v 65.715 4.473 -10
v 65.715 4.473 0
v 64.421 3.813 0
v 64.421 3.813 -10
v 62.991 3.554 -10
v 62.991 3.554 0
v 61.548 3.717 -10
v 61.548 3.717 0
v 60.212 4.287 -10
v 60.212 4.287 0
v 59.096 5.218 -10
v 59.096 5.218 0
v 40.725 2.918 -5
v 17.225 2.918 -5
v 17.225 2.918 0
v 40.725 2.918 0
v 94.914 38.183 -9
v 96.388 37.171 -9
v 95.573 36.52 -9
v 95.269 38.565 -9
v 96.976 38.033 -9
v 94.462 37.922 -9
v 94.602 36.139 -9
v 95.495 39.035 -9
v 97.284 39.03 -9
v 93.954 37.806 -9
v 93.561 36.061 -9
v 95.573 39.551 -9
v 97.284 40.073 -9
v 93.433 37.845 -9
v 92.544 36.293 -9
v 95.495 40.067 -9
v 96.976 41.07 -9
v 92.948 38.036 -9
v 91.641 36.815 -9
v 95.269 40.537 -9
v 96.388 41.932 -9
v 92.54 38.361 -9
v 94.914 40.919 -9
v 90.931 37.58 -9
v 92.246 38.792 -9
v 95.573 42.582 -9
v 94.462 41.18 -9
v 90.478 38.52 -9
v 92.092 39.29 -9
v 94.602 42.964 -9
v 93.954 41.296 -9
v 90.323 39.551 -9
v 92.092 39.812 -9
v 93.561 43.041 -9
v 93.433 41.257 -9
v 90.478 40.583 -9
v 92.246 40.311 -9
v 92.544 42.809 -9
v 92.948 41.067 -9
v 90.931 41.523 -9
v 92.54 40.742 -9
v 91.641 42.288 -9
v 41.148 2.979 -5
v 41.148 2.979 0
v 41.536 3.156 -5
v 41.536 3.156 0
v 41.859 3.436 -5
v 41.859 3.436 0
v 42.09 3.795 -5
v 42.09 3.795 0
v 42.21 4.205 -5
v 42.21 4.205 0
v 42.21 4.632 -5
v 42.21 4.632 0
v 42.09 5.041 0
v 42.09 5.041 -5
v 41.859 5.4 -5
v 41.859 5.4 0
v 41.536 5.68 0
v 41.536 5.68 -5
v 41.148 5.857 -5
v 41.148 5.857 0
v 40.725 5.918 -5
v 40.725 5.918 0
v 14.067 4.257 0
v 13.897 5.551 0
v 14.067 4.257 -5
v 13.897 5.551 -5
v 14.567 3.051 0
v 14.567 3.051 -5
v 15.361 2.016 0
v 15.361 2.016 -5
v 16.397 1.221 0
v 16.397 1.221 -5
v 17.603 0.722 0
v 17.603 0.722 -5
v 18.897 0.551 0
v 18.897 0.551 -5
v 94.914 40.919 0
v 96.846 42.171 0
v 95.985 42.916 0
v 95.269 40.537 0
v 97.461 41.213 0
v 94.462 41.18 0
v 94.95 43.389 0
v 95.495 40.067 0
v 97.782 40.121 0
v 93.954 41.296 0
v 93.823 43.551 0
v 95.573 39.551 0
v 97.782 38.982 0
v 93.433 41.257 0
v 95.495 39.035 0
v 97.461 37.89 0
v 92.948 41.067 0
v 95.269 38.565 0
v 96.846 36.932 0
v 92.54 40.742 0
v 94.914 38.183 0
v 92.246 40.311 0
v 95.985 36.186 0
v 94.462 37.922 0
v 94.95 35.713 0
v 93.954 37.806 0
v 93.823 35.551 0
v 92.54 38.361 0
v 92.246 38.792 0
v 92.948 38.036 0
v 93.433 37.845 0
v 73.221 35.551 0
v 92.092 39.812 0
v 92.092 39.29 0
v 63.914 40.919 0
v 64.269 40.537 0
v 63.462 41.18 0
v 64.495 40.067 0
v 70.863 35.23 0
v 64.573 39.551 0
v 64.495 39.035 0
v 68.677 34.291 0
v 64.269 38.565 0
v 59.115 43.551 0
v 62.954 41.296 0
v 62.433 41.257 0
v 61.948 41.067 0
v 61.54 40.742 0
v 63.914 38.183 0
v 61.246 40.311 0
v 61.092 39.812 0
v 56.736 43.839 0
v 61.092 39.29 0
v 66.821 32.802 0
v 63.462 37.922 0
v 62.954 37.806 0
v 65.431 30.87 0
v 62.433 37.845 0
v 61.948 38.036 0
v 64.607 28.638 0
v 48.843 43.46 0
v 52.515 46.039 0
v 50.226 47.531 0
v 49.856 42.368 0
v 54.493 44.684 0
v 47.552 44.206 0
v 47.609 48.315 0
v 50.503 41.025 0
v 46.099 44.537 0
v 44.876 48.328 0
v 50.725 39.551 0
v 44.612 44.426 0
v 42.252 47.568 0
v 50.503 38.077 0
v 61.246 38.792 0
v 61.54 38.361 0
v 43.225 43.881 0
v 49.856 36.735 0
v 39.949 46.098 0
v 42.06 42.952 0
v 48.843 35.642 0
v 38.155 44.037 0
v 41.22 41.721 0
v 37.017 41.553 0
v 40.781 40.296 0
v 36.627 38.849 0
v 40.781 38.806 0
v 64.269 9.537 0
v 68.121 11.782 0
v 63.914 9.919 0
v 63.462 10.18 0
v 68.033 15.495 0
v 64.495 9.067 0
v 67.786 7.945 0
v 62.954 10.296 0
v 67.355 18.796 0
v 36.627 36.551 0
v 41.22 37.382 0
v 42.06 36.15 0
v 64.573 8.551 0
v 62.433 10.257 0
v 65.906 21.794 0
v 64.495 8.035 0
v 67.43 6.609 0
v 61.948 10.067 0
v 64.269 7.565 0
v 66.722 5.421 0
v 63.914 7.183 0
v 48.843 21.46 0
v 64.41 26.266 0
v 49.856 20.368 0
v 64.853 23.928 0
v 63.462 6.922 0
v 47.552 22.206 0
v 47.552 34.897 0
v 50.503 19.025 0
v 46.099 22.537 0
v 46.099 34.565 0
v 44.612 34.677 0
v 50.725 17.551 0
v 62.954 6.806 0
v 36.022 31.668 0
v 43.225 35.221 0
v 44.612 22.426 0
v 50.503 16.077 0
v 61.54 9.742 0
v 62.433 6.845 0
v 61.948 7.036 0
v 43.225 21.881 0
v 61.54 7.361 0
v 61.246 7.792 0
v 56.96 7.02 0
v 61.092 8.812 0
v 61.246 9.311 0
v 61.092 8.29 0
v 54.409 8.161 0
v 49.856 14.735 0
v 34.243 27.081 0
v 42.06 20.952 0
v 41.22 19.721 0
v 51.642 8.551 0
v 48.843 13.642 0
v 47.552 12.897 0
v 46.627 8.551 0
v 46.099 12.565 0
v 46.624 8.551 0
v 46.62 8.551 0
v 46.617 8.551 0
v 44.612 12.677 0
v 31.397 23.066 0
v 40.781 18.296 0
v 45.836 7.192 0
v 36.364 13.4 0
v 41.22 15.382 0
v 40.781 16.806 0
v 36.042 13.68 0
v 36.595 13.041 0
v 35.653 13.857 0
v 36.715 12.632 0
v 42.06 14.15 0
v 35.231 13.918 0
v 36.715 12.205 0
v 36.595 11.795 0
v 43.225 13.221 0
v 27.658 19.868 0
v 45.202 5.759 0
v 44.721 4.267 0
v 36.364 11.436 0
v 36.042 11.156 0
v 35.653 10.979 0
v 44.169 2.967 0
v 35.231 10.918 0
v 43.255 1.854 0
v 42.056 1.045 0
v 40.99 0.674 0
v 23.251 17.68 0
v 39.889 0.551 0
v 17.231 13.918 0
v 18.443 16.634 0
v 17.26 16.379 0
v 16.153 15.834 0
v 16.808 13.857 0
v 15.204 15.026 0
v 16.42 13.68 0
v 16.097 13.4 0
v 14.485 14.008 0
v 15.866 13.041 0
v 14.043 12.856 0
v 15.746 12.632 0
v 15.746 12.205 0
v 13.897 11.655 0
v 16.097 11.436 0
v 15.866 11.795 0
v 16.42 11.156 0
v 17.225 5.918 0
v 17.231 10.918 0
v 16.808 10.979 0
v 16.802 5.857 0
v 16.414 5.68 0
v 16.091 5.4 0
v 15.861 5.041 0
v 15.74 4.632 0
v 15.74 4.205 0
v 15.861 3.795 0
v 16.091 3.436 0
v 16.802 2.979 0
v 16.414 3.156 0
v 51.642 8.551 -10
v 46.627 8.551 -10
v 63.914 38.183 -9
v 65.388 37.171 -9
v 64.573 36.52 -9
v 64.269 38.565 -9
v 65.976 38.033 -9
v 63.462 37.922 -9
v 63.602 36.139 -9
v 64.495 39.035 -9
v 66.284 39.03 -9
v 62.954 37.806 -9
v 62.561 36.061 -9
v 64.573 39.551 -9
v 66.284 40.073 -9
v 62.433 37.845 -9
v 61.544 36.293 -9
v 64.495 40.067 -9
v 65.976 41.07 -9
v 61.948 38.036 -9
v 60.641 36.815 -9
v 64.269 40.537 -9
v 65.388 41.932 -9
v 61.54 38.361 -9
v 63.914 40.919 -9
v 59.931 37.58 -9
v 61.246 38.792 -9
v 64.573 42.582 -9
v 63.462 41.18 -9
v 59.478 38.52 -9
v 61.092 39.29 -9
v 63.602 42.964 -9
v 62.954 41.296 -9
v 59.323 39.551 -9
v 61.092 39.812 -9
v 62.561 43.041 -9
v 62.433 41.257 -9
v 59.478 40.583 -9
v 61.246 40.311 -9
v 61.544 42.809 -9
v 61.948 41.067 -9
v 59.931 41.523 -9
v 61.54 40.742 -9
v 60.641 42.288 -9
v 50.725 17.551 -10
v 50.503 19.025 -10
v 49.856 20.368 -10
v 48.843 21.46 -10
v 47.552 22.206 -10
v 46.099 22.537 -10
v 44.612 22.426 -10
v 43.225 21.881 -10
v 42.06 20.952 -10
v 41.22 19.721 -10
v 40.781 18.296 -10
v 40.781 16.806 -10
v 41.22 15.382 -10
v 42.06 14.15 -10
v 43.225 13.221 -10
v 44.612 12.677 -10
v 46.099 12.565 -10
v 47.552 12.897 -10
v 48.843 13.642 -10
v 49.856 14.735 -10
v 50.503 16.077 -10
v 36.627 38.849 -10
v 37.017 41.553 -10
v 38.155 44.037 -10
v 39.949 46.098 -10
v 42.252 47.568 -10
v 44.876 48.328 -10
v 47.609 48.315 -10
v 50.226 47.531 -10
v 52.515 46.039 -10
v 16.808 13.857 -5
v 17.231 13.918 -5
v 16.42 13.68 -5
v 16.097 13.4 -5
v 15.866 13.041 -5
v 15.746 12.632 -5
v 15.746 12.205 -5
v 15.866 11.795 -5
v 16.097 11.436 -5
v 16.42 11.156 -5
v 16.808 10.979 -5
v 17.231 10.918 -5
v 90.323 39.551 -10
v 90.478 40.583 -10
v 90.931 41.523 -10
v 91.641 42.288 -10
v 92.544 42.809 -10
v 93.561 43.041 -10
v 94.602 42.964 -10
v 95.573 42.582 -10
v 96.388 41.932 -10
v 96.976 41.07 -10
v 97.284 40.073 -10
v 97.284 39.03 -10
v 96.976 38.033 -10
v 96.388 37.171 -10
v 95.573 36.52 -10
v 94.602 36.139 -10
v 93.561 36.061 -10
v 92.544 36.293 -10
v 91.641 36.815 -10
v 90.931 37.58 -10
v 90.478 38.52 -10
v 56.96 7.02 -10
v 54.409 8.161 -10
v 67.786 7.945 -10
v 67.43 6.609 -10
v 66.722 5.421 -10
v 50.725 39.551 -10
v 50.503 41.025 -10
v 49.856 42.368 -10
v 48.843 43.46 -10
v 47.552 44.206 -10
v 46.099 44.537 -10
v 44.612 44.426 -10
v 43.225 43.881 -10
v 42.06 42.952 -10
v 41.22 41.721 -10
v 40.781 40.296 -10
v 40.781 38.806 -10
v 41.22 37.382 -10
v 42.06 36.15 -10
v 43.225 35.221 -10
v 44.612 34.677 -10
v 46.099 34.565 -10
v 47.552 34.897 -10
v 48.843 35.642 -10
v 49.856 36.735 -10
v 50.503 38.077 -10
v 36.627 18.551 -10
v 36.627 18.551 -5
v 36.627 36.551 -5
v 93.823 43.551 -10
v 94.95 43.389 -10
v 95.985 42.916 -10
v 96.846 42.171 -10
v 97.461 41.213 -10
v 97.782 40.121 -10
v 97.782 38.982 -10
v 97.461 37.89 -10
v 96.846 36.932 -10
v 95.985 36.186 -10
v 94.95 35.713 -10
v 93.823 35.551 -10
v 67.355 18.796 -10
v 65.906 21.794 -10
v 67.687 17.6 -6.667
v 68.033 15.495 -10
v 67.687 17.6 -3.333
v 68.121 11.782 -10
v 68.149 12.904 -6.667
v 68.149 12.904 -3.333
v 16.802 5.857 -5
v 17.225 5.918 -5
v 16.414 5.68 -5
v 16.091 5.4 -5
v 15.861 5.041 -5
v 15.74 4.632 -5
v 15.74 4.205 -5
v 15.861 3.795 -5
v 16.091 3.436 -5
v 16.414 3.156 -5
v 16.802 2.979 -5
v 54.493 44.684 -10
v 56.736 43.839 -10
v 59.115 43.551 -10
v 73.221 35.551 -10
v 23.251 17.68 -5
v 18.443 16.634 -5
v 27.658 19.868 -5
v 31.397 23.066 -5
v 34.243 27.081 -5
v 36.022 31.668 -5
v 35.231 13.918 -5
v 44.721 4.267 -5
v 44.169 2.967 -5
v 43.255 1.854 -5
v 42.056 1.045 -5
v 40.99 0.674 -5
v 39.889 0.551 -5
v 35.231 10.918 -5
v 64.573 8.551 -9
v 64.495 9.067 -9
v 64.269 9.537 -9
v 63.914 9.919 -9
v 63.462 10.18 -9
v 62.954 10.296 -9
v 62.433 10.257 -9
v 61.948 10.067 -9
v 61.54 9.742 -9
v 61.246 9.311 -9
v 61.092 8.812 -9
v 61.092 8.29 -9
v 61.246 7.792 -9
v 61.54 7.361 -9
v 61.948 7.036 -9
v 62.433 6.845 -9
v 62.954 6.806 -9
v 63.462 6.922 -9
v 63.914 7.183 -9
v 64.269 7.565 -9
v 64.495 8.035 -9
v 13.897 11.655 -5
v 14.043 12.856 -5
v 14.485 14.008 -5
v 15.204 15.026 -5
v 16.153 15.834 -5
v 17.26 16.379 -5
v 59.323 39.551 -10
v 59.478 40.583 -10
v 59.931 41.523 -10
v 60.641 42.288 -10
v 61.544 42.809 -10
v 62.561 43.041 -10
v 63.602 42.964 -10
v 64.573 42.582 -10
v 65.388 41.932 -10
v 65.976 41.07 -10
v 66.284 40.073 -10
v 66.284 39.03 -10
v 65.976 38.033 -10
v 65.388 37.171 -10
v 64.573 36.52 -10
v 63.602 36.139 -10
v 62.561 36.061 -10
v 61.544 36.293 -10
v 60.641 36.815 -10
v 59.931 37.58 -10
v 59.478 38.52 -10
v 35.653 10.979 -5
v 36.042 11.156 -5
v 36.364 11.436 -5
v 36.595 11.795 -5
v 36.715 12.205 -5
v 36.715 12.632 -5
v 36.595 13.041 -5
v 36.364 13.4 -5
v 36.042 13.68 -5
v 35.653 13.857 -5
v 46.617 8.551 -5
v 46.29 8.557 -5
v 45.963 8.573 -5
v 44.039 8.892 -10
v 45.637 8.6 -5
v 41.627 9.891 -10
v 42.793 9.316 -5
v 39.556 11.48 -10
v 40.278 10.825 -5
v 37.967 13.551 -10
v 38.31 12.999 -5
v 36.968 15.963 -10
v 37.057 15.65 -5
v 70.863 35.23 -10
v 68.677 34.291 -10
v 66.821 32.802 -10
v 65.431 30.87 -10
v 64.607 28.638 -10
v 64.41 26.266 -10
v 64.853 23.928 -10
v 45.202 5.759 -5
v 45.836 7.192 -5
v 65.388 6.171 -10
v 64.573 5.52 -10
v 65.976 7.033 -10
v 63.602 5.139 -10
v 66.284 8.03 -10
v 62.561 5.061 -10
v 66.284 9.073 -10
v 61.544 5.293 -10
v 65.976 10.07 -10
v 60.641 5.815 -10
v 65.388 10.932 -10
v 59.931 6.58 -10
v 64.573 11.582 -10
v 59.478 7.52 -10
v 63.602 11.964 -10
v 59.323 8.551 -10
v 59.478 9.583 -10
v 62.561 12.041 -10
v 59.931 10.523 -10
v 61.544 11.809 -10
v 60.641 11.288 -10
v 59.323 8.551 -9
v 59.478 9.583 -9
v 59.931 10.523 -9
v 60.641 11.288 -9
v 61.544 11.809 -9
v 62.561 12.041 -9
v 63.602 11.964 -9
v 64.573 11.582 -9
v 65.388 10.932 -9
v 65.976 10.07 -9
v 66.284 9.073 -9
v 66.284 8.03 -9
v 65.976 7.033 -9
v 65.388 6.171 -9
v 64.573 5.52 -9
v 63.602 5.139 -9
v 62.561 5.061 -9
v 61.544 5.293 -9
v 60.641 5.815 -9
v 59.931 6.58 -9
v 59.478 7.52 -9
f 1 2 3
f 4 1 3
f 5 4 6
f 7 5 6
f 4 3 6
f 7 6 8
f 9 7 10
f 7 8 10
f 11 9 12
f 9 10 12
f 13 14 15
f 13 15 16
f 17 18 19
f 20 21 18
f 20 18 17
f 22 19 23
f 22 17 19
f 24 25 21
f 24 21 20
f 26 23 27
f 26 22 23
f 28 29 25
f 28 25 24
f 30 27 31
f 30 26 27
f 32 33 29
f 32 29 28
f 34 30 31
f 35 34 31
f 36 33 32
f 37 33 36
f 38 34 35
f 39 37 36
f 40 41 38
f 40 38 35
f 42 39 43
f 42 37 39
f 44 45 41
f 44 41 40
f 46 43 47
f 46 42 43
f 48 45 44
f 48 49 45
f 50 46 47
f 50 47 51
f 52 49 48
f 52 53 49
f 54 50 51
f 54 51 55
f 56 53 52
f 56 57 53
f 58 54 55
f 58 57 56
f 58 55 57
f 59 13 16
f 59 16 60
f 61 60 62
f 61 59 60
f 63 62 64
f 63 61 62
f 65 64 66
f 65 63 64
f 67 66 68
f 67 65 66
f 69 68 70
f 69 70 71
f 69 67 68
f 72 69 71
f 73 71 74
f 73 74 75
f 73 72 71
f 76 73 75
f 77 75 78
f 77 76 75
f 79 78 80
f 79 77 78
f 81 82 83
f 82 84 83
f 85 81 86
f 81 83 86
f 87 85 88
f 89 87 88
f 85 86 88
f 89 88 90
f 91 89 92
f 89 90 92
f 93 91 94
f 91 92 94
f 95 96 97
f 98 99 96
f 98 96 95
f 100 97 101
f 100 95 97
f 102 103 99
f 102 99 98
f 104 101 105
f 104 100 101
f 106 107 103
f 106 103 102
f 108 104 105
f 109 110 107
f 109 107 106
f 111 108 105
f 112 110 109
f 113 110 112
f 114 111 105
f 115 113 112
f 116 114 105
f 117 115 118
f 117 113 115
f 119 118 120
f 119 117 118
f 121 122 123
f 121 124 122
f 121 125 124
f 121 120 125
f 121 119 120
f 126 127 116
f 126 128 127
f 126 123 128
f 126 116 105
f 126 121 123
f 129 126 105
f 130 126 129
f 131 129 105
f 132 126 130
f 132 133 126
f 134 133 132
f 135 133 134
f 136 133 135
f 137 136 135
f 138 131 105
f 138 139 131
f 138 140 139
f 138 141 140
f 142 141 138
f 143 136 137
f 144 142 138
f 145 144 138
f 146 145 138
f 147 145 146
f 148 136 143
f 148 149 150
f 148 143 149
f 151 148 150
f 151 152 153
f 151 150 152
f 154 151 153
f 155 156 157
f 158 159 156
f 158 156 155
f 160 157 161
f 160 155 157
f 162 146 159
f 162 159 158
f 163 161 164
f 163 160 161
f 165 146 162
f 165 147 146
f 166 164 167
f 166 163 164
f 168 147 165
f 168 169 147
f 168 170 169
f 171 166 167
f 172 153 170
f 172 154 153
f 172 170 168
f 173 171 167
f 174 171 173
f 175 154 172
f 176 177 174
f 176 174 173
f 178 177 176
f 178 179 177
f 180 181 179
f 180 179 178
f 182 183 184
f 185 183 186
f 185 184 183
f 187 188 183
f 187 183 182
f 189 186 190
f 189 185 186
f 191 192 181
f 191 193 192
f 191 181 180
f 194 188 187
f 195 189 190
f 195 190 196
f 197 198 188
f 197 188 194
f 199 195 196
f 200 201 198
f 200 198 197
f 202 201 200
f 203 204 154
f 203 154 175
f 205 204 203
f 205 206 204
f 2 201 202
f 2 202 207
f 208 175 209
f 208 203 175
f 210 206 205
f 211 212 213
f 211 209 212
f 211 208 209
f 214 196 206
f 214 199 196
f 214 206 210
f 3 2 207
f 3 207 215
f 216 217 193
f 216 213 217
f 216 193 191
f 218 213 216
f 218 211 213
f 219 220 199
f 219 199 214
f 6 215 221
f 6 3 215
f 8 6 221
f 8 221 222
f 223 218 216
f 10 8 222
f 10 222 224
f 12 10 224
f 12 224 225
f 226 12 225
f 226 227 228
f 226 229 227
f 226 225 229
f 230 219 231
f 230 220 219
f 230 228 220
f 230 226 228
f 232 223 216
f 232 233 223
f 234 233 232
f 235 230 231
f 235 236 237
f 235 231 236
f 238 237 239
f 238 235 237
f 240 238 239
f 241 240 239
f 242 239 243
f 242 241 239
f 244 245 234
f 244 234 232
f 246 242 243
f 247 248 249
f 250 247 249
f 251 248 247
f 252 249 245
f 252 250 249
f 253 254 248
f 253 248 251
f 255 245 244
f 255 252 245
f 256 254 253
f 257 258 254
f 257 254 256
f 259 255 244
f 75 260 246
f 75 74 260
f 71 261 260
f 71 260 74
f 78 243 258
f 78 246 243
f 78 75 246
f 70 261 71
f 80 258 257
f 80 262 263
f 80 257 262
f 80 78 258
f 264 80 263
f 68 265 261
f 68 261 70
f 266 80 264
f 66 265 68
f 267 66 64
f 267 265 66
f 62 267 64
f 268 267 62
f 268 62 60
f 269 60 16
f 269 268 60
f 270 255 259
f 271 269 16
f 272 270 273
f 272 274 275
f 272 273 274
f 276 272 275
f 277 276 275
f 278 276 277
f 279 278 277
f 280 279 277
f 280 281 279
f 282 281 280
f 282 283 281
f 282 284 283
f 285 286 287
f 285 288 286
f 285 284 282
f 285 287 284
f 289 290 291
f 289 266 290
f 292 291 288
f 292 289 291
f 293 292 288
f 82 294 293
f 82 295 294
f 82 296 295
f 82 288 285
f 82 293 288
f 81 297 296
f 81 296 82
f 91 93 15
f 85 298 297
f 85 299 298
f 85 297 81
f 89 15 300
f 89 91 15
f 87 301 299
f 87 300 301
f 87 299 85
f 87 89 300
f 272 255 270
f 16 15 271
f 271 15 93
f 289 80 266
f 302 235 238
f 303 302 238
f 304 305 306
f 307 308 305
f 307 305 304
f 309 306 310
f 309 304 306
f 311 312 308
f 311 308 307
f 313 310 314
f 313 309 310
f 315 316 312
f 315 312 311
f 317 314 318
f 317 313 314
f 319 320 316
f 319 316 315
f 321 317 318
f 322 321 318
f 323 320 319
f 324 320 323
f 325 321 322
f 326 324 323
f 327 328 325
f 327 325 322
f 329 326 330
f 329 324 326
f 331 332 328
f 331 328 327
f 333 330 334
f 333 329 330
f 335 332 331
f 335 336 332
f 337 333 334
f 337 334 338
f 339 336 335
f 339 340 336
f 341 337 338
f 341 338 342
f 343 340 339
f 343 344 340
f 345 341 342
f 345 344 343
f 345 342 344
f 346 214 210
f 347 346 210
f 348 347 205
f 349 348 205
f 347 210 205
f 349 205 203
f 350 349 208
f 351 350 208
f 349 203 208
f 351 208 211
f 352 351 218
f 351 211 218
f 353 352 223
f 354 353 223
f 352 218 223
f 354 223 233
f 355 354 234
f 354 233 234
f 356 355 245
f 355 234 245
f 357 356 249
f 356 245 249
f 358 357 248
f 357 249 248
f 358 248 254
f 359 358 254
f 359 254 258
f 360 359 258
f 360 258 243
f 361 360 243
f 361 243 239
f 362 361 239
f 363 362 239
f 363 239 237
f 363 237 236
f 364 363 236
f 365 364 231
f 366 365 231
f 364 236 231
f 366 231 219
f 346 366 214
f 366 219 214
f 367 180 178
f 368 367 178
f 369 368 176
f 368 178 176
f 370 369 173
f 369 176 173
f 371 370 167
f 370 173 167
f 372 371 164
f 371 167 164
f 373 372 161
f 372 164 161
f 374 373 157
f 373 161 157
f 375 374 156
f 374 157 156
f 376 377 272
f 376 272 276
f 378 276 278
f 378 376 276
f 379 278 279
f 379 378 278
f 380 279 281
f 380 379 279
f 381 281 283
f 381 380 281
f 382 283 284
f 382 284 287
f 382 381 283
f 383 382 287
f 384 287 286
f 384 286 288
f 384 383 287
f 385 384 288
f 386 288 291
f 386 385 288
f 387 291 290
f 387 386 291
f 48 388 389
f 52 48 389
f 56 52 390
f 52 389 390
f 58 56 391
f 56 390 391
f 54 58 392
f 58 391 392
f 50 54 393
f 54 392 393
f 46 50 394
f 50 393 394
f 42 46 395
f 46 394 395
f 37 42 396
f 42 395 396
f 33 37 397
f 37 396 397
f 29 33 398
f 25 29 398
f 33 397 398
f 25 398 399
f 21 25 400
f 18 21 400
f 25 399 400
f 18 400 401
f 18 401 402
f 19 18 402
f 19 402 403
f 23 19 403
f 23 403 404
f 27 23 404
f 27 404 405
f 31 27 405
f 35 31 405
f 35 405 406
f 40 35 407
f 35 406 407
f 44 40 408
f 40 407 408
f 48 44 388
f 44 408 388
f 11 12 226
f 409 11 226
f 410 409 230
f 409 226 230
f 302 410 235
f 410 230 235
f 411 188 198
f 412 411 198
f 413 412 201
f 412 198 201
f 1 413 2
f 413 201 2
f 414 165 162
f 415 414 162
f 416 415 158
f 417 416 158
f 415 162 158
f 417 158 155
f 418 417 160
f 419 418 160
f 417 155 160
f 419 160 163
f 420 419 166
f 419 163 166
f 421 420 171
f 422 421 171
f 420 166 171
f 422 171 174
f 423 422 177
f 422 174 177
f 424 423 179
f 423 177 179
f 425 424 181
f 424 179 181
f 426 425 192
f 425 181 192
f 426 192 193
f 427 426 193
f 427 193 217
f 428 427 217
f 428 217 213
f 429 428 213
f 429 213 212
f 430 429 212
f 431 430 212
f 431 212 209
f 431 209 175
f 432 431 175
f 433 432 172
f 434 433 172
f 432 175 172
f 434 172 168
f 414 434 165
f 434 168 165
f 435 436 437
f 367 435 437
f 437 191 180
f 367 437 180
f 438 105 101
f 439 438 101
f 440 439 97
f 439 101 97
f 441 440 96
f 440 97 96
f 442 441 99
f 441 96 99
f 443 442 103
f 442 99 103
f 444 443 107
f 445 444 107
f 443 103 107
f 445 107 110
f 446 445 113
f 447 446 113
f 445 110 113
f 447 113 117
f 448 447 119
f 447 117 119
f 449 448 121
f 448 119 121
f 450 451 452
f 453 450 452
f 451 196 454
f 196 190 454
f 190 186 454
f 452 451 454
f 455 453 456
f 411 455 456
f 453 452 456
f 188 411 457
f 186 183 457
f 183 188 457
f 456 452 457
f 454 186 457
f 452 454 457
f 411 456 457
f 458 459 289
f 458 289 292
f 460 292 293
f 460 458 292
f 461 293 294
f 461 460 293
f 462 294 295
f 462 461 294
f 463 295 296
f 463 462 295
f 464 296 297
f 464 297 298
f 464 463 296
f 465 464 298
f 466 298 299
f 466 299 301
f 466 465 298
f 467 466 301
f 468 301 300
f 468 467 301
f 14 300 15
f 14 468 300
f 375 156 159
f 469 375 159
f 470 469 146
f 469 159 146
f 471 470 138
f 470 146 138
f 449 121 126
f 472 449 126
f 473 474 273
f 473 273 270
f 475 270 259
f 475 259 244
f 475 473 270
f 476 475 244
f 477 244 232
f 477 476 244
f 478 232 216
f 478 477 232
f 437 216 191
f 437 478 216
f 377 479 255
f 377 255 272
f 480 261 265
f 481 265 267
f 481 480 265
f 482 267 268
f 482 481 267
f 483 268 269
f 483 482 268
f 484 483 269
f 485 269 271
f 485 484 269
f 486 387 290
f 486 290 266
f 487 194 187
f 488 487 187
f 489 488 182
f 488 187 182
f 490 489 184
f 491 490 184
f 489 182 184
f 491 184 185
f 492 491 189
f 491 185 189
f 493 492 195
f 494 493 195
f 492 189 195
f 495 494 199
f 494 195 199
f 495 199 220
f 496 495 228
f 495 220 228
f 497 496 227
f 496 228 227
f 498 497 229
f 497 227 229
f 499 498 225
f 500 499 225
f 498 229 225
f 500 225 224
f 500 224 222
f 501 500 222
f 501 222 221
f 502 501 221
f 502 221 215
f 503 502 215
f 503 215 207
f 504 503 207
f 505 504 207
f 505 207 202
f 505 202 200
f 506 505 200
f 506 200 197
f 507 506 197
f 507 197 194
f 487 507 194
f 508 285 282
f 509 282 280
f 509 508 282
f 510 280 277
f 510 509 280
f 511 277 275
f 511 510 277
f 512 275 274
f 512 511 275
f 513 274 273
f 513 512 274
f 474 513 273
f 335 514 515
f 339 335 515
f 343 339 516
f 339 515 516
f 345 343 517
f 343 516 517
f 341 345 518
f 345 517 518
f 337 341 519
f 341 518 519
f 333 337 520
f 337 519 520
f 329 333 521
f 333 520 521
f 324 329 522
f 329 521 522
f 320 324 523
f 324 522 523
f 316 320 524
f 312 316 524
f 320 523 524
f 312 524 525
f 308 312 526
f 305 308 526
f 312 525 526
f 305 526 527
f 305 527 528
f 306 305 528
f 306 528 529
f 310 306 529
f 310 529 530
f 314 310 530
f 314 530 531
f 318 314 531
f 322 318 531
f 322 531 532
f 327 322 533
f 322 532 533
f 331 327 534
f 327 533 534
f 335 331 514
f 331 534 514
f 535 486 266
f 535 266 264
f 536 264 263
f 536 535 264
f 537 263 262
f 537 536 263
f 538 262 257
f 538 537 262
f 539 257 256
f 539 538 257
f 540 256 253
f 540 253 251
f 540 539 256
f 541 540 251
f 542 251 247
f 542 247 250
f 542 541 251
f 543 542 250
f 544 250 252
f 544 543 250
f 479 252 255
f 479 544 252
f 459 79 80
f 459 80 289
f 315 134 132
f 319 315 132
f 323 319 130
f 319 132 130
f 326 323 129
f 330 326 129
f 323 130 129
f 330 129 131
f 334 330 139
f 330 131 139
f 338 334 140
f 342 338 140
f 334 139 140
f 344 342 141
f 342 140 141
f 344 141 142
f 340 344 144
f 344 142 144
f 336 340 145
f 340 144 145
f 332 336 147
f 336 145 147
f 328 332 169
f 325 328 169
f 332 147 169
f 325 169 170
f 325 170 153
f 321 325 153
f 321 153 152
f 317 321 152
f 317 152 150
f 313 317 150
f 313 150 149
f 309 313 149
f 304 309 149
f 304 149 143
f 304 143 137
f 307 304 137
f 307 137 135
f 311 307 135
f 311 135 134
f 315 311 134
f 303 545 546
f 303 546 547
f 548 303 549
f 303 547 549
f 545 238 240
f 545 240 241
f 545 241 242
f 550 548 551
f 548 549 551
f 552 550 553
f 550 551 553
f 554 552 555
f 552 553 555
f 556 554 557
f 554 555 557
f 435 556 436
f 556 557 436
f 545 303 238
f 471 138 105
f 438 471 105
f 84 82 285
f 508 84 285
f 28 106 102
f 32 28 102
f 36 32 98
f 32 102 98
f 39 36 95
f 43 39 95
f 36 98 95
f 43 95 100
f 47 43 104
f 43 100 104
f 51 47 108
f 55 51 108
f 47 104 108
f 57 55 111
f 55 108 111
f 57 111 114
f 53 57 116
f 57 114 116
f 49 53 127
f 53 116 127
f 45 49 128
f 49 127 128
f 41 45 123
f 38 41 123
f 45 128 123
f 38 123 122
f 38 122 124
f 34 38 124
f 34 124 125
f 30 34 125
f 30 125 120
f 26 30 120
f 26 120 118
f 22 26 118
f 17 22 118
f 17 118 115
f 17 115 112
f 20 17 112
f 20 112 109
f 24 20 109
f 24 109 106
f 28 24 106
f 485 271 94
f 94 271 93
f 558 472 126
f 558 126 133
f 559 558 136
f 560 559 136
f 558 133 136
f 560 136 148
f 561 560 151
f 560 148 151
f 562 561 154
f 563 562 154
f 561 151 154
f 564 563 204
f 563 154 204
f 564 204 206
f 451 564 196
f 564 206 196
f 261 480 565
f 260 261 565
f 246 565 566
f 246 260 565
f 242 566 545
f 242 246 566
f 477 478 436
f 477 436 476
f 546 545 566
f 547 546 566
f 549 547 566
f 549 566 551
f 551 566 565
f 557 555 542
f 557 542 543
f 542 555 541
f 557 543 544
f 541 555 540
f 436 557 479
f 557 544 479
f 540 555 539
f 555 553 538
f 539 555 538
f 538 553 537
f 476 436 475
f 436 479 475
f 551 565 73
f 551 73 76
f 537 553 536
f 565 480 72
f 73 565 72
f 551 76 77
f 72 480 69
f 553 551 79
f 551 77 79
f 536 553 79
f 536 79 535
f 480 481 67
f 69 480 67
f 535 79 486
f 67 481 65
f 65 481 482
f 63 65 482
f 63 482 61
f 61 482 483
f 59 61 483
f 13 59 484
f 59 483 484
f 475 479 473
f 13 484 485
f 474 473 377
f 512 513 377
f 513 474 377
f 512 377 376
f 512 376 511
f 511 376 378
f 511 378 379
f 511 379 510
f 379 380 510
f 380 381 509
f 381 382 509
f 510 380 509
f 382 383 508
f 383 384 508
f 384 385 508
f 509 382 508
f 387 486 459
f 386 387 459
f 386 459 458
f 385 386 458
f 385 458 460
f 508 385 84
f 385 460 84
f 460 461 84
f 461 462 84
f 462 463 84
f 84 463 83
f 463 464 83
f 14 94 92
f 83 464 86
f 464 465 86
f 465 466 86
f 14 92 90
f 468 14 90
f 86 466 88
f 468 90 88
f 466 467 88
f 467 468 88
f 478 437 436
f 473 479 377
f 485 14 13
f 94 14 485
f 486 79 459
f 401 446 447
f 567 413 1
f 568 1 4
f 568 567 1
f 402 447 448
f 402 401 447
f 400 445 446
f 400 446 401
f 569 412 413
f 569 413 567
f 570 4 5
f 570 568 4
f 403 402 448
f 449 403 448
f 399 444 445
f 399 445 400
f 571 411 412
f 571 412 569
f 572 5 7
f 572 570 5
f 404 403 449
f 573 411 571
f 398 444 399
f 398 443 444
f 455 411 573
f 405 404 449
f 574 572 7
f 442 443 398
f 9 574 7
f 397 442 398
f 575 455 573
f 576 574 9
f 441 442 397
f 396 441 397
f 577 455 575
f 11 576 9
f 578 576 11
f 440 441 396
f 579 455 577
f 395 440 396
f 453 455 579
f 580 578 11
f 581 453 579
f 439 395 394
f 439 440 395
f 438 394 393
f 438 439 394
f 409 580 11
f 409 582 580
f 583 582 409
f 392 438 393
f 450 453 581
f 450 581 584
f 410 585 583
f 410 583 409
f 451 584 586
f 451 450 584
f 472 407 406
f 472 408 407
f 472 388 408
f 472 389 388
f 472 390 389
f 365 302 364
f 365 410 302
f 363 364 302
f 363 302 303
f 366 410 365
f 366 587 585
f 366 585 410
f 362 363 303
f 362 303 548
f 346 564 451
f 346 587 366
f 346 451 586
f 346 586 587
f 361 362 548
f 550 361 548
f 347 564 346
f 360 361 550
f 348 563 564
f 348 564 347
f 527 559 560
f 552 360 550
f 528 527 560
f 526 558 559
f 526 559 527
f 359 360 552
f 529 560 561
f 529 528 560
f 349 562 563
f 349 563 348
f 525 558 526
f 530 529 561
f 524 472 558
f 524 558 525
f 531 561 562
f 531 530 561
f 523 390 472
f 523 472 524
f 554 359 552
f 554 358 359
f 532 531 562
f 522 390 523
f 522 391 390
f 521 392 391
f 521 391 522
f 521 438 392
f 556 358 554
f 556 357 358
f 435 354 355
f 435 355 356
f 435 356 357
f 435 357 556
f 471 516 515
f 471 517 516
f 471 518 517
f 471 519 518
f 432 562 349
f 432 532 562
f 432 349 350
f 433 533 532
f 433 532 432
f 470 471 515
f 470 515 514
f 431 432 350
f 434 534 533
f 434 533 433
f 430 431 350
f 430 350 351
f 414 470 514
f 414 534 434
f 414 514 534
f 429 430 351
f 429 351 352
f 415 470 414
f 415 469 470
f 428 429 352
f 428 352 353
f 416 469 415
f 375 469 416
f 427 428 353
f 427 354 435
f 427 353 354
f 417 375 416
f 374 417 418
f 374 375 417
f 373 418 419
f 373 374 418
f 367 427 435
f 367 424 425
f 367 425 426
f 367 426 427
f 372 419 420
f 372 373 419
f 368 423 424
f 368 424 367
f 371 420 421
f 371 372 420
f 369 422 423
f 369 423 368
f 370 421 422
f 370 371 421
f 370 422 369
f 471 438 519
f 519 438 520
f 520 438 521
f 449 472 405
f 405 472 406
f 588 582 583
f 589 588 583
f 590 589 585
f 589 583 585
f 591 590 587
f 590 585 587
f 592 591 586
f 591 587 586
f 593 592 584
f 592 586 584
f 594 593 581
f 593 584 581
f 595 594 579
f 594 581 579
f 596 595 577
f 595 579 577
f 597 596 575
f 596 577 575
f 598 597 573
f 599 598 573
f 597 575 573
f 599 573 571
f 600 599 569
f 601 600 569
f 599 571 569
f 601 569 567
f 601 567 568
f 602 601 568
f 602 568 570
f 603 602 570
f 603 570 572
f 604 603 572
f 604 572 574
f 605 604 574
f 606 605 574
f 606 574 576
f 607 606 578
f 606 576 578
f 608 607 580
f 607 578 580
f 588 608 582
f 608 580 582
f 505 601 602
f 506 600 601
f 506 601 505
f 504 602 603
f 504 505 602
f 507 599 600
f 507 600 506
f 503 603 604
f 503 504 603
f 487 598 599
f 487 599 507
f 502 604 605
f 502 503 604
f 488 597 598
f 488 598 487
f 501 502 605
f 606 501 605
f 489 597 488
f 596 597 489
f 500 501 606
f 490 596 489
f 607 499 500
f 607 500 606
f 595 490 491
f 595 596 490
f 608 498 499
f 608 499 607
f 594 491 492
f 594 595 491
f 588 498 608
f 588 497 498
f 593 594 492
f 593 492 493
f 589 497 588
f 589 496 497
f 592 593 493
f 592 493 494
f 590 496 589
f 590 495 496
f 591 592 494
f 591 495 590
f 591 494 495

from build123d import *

# Parameters (mm, degrees)
SKETCH1_R           = 1.75
SKETCH1_R_2         = 5
BOSS_EXTRUDE1_DEPTH = 10
EXTRUDE1_DEPTH      = 5
FILLET2_R           = 20
FILLET3_R           = 5
FILLET5_R           = 5
EXTRUDE2_DEPTH      = 5
FILLET7_R           = 475
FILLET8_R           = 15
FILLET9_R           = 5
SKETCH4_R           = 3.5
EXTRUDE3_DEPTH      = 1


with BuildPart() as part:
    # Sketch1 → Boss-Extrude1 (new body)
    with BuildSketch(Plane.XY):
        with BuildLine():
            Line((59.115327383, 43.551262968), (93.822811009, 43.551262968))
            ThreePointArc((93.822811009, 43.551262968), (97.822811009, 39.551262968), (93.822811009, 35.551262968))
            Line((93.822811009, 35.551262968), (73.221068218, 35.551262968))
            ThreePointArc((73.221068218, 35.551262968), (65.430500205, 30.870379763), (65.905746743, 21.794160382))
            add(Edge.make_bspline(
                [(65.905746743, 21.794160382), (68.510586107, 17.931817085), (68.397648351, 12.955422289), (67.785956814, 7.945306105)],
                knots=[0, 0, 0, 0, 1, 1, 1, 1], degree=3))
            ThreePointArc((67.785956814, 7.945306105), (67.117243875, 5.990433735), (65.715264602, 4.47281814))
            ThreePointArc((65.715264602, 4.47281814), (62.263505272, 3.582643734), (59.096031047, 5.217929635))
            ThreePointArc((59.096031047, 5.217929635), (55.724954026, 7.67997226), (51.642471122, 8.551262968))
            Line((51.642471122, 8.551262968), (46.626949913, 8.551262968))
            ThreePointArc((46.626949913, 8.551262968), (39.555882101, 11.480195156), (36.626949913, 18.551262968))
            Line((36.626949913, 18.551262968), (36.626949913, 38.848632096))
            ThreePointArc((36.626949913, 38.848632096), (42.251881835, 47.568318218), (52.515088487, 46.03881686))
            ThreePointArc((52.515088487, 46.03881686), (55.588605185, 44.19379373), (59.115327383, 43.551262968))
        make_face()
        with Locations((93.822811009, 39.551262968)):
            Circle(SKETCH1_R, mode=Mode.SUBTRACT)
        with Locations((62.822811009, 39.551262968)):
            Circle(SKETCH1_R, mode=Mode.SUBTRACT)
        with Locations((62.822811009, 8.551262968)):
            Circle(SKETCH1_R, mode=Mode.SUBTRACT)
        with Locations((45.725055781, 39.551262968)):
            Circle(SKETCH1_R_2, mode=Mode.SUBTRACT)
        with Locations((45.725055781, 17.551264875)):
            Circle(SKETCH1_R_2, mode=Mode.SUBTRACT)
    extrude(amount=-BOSS_EXTRUDE1_DEPTH)

    # Sketch2 → Extrude1 (add)
    with BuildSketch(Plane.XY):
        Polygon((45.636633265, 8.551262968), (43.896905309, 0.551262968), (13.896905309, 0.551262968), (13.896905309, 16.551262968), (39.149006125, 16.551262968), (41.006428166, 12.551262968), (45.636633265, 10.857586925), align=None)
    extrude(amount=-EXTRUDE1_DEPTH)

    # Fillet2
    # the kernel refuses this fillet: 20 mm, written as the material it adds along each edge
    with BuildSketch(Plane(origin=(36.828990942, 16.551262968, -5), x_dir=(-0.010101536018348446, 0.9999489781834221, 0), z_dir=(0, 0, 1))) as fillet2_piece_1:
        with BuildLine():
            CenterArc((20.203051209, 19.998979564), FILLET2_R, 179.421214776, 90)
            Line((0.204071645, 20.201010284), (-1.795826311, 20.221213356))
            Line((-1.795826311, 20.221213356), (-1.999897956, 0.020203072))
            Line((-1.999897956, 0.020203072), (0.380184704, -1.963532427))
            ThreePointArc((0.380184704, -1.963532427), (1.981735809, -1.818070308), (19.980817416, -1.999897956))
            Line((19.980817416, -1.999897956), (20.001020488, 0))
        make_face()
    extrude(amount=5)

    # Fillet3
    fillet3_edges = [part.edges().sort_by_distance(p)[0] for p in [
        (13.896905309, 16.551262968, -2.5),
    ]]
    fillet(fillet3_edges, radius=FILLET3_R)

    # Fillet5
    fillet5_edges = [part.edges().sort_by_distance(p)[0] for p in [
        (13.896905309, 0.551262968, -2.5),
    ]]
    fillet(fillet5_edges, radius=FILLET5_R)

    # Sketch3 → Extrude2 (cut)
    with BuildSketch(Plane(origin=(0, 0, -5), x_dir=(-1, 0, 0), z_dir=(0, 0, -1))):
        with BuildLine():
            Line((-17.230767467, 10.918134064), (-35.230767467, 10.918134064))
            ThreePointArc((-35.230767467, 10.918134064), (-36.730767467, 12.418134064), (-35.230767467, 13.918134064))
            Line((-35.230767467, 13.918134064), (-17.230767467, 13.918134064))
            ThreePointArc((-17.230767467, 13.918134064), (-15.730767467, 12.418134064), (-17.230767467, 10.918134064))
        make_face()
        with BuildLine():
            Line((-17.225055781, 2.918134064), (-40.725055781, 2.918134064))
            ThreePointArc((-40.725055781, 2.918134064), (-42.225055781, 4.418134064), (-40.725055781, 5.918134064))
            Line((-40.725055781, 5.918134064), (-17.225055781, 5.918134064))
            ThreePointArc((-17.225055781, 5.918134064), (-15.725055781, 4.418134064), (-17.225055781, 2.918134064))
        make_face()
    extrude(amount=-EXTRUDE2_DEPTH, mode=Mode.SUBTRACT)

    # Fillet7
    # the kernel refuses this fillet: 475 mm, written as the material it adds along each edge
    with BuildSketch(Plane(origin=(45.636633265, 8.600420143, -5), x_dir=(0, -1, 0), z_dir=(0, 0, 1))) as fillet7_piece_1:
        with BuildLine():
            CenterArc((475.04890177, 0.492579304), FILLET7_R, 179.941199476, 0.118216777)
            ThreePointArc((0.049151908, 0.980054022), (0.036604611, 0.489423747), (0, 0))
            Line((0, 0), (0.049157175, 0))
        make_face()
    extrude(amount=5)

    # Fillet8
    # the kernel refuses this fillet: 15 mm, written as the material it adds along each edge
    with BuildSketch(Plane(origin=(45.636633265, 8.551262968, 0), x_dir=(0.999999999985564, 5.37325013854713e-06, 0), z_dir=(0, 0, -1))) as fillet8_piece_1:
        with BuildLine():
            CenterArc((13.580951994, 8.137405625), FILLET8_R, 192.269167845, 20.584390422)
            Line((-1.076449047, 4.949836848), (0, 0))
            ThreePointArc((0, 0), (0.490027011, -0.000252765), (0.980054022, 0))
        make_face()
    extrude(amount=5)

    # Fillet9
    fillet9_edges = [part.edges().sort_by_distance(p)[0] for p in [
        (43.896905309, 0.551262968, -2.5),
    ]]
    fillet(fillet9_edges, radius=FILLET9_R)

    # Sketch4 → Extrude3 (cut)
    with BuildSketch(Plane(origin=(0, 0, -10), x_dir=(-1, 0, 0), z_dir=(0, 0, -1))):
        with Locations((-62.822811009, 39.551262968)):
            Circle(SKETCH4_R)
        with Locations((-93.822811009, 39.551262968)):
            Circle(SKETCH4_R)
        with Locations((-62.822811009, 8.551262968)):
            Circle(SKETCH4_R)
    extrude(amount=-EXTRUDE3_DEPTH, mode=Mode.SUBTRACT)


solid = part.part
